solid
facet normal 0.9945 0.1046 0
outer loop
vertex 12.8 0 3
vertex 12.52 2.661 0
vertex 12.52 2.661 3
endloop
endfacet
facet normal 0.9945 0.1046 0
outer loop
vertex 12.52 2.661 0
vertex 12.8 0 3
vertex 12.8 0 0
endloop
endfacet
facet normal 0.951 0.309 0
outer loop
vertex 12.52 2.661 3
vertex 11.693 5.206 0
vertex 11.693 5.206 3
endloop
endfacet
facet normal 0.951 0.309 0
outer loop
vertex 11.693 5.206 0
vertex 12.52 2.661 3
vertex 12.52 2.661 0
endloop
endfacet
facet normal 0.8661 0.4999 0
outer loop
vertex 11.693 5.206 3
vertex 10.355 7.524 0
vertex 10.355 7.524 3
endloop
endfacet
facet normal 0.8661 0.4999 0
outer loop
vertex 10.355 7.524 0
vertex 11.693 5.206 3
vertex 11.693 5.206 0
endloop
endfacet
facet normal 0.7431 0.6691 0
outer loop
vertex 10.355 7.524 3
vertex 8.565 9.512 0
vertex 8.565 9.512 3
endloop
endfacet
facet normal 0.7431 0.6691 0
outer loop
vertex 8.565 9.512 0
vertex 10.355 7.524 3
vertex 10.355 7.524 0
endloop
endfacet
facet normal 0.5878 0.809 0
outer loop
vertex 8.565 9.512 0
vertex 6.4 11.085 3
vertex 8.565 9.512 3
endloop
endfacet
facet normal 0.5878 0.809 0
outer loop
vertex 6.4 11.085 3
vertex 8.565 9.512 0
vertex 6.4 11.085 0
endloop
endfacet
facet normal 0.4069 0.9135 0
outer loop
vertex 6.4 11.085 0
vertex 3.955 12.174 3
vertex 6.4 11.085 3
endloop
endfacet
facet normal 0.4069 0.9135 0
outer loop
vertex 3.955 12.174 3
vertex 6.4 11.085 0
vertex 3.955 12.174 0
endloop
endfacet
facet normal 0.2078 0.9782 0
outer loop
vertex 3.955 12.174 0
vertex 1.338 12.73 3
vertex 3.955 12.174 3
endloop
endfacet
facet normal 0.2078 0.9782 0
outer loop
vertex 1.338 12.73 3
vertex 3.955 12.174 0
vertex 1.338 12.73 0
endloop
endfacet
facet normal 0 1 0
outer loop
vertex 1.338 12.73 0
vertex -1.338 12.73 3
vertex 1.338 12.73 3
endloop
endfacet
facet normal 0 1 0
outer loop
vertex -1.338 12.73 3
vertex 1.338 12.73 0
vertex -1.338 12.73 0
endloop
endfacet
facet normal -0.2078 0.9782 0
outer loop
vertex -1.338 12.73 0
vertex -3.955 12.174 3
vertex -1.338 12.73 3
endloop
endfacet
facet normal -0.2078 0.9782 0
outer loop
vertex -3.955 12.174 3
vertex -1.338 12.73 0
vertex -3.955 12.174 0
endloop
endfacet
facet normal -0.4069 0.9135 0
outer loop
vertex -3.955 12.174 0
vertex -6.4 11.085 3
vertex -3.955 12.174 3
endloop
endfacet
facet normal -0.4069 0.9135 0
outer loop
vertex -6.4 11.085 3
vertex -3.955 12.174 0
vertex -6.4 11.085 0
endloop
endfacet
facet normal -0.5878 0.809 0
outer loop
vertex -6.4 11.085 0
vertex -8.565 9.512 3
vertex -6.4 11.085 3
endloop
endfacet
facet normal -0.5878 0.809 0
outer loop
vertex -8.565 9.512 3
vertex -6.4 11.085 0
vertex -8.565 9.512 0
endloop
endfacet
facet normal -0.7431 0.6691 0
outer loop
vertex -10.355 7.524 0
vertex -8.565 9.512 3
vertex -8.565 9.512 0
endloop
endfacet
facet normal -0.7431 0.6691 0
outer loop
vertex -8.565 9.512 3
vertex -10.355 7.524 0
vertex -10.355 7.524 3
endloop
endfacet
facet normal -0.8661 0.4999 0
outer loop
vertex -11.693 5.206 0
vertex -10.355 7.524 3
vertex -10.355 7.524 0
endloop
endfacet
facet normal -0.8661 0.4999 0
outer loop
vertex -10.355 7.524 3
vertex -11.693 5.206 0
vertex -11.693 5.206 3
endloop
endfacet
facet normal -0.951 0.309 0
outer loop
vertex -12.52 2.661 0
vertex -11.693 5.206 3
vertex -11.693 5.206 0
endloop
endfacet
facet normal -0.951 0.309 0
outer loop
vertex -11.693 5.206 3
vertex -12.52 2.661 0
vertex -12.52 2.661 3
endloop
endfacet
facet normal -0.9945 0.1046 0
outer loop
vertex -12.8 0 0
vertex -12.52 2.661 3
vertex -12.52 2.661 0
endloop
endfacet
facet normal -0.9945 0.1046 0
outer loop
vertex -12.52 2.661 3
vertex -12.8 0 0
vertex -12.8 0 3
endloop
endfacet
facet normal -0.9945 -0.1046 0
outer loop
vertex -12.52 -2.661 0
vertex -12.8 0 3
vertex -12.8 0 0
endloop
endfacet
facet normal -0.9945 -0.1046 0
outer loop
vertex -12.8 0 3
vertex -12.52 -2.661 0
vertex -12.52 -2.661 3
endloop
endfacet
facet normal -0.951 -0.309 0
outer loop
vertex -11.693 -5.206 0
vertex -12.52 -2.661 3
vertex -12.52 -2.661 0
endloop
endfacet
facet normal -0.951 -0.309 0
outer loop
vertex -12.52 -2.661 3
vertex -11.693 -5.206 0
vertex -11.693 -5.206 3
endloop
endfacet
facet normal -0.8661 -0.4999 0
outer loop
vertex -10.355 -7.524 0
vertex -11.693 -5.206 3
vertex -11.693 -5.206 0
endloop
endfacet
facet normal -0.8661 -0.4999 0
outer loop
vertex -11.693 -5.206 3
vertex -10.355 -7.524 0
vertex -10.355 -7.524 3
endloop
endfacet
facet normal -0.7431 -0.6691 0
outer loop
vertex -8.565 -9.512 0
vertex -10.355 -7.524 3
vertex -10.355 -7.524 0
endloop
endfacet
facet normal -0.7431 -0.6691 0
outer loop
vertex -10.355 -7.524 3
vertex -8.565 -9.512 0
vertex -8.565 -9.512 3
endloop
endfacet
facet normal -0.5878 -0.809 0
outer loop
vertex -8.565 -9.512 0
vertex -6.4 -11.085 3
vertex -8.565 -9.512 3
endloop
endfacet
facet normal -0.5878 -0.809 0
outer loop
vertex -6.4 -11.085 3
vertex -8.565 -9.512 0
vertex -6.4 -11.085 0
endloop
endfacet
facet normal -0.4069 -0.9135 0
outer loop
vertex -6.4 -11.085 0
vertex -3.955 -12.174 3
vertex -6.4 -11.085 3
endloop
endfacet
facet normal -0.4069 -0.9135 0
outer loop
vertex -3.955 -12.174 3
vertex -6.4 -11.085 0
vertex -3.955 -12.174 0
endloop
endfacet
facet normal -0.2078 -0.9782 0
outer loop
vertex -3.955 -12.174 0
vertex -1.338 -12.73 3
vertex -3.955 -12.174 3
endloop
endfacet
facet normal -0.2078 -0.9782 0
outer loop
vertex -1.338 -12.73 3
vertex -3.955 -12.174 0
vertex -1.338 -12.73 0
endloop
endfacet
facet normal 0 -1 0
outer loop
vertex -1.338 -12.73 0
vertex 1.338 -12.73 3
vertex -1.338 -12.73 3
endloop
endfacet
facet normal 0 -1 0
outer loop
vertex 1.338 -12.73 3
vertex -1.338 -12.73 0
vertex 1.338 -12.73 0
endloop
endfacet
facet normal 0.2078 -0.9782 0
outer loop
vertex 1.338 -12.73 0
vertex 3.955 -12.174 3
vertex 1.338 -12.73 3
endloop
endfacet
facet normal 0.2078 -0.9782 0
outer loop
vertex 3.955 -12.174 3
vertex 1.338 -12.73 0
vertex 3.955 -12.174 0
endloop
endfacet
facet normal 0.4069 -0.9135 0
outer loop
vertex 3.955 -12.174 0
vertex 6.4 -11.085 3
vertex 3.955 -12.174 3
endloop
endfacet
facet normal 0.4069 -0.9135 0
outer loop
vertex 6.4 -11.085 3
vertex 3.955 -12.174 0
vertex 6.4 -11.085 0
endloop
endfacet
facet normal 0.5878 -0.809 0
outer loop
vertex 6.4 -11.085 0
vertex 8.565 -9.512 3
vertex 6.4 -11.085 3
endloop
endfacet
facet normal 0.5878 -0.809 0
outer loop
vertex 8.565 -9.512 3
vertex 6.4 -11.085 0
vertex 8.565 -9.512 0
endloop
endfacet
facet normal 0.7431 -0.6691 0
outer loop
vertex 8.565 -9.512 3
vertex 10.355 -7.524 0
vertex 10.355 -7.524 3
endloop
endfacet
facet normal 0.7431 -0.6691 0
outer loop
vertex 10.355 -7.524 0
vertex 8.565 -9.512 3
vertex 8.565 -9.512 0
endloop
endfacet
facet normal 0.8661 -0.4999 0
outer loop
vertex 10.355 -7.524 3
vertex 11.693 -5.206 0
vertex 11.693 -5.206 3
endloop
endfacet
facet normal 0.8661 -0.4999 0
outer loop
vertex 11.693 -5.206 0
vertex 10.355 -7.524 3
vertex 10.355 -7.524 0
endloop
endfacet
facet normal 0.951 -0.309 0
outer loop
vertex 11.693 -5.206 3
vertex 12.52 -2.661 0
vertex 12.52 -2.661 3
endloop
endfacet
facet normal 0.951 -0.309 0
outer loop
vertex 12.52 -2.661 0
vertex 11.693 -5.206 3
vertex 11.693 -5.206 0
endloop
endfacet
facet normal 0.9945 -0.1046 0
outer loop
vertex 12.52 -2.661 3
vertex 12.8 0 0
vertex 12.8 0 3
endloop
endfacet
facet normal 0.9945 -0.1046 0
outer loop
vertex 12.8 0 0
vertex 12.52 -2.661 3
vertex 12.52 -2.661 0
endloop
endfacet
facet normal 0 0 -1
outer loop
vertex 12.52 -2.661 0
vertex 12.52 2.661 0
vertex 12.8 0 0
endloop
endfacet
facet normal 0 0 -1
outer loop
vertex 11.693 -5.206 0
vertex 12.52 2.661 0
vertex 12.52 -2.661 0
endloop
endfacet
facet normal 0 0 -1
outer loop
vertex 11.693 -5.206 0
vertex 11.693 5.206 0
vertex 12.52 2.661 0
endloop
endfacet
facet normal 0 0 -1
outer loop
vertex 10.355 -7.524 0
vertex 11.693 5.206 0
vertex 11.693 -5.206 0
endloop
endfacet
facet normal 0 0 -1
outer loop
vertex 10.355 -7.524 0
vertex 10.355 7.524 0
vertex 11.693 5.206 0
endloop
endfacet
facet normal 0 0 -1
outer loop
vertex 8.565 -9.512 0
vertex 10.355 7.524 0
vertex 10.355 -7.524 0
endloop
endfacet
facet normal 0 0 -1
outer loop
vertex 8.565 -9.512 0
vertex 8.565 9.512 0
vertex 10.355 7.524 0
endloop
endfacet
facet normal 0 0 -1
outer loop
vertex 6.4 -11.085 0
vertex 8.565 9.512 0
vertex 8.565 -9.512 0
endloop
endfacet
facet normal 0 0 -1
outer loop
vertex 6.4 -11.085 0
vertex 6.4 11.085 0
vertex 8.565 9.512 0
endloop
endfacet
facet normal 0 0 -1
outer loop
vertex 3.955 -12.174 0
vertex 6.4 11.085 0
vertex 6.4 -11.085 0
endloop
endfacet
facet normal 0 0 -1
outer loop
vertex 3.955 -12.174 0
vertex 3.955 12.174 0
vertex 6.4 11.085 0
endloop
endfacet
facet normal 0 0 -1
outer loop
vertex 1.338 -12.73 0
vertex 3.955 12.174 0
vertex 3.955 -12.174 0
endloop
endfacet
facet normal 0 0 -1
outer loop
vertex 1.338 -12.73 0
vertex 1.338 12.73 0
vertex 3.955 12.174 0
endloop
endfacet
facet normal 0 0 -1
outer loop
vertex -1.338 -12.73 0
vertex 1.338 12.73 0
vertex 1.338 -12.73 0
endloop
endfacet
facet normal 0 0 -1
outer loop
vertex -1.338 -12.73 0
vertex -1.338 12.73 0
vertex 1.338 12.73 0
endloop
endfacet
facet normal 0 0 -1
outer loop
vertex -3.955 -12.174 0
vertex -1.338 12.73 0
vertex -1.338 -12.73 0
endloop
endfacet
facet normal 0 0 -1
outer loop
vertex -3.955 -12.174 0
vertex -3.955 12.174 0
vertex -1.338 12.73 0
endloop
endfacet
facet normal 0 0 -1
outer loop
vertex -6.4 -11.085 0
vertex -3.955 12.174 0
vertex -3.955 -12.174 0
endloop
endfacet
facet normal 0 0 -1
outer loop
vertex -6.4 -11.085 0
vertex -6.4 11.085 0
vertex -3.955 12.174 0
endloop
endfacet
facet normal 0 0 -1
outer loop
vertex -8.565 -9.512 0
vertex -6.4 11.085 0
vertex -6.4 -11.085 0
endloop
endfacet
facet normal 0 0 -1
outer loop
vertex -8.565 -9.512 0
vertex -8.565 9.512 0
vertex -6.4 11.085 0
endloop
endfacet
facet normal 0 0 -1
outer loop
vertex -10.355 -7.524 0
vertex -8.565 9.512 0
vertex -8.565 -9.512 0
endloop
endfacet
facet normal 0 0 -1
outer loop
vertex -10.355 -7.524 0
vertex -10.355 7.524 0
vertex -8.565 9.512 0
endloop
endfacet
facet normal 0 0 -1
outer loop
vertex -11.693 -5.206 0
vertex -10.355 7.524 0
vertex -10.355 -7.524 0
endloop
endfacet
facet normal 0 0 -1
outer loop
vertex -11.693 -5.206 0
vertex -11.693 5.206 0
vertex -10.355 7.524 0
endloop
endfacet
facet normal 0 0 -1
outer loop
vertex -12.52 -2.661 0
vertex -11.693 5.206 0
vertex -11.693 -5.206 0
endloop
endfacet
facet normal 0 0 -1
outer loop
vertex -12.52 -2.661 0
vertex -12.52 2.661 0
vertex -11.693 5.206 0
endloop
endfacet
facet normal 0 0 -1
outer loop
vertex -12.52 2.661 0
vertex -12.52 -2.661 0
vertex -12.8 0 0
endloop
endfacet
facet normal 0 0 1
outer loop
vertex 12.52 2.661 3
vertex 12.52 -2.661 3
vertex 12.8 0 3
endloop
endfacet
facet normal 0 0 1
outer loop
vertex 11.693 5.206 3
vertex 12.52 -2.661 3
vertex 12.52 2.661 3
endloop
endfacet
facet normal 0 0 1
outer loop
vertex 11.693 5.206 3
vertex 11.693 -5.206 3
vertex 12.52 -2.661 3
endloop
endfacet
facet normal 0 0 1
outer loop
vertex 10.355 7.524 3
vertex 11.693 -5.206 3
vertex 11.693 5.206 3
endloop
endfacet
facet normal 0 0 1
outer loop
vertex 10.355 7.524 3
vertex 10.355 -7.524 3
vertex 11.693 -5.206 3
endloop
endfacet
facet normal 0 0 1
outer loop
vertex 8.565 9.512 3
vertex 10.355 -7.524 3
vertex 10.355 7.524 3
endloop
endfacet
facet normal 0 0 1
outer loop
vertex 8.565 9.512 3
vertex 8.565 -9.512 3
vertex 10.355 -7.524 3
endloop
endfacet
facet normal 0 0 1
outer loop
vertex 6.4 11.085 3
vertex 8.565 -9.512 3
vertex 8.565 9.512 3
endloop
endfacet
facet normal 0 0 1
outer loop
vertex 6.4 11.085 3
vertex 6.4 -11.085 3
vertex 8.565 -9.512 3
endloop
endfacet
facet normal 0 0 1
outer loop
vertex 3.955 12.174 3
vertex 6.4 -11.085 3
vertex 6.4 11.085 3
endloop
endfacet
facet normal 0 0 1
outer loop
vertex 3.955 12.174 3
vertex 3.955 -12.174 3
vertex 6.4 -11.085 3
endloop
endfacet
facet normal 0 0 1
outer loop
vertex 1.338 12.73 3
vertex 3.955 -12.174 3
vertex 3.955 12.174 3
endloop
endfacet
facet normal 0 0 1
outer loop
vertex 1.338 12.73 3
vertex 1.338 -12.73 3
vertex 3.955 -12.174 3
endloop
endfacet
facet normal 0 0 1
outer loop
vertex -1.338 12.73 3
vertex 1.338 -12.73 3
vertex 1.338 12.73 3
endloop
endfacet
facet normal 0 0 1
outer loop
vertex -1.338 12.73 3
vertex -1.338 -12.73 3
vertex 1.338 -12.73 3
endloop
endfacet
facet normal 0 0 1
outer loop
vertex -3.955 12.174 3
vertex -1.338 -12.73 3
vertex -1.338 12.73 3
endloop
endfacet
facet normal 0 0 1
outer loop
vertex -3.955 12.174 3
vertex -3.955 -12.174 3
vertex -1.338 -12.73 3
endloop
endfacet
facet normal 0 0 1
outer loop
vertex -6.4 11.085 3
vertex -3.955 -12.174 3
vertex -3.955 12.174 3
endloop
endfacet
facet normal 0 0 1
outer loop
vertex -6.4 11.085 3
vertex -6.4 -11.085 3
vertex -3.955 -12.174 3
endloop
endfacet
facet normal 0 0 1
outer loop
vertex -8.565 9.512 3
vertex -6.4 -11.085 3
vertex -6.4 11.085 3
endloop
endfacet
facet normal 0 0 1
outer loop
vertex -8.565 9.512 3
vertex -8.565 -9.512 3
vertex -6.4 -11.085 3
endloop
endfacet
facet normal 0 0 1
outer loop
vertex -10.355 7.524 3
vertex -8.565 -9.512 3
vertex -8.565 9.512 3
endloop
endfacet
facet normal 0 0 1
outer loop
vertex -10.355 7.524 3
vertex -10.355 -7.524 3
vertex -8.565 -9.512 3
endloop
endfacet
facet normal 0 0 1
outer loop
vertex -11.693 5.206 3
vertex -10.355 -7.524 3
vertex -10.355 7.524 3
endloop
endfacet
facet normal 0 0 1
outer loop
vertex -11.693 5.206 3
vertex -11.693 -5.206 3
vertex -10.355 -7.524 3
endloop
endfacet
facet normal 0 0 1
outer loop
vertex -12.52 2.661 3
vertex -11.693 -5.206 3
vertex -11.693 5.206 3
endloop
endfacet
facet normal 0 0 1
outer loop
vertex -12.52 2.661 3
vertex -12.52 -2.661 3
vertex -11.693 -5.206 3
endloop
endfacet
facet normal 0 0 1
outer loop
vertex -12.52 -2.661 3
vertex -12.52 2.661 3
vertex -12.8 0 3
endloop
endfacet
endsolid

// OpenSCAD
/*UV led holder 
UV leds used in this project are tiny and don't emmit enough light when used individually. Here we design a holder so that multiple leds can be used for one light system.

Designed by AM Chagas 2018 CC BY 4.0

*/




ledx=3.5;
ledy=3.5;
ledz=2;
tol=0.15;
holdd = 25.6;


cylinder(d=holdd,h=3);
